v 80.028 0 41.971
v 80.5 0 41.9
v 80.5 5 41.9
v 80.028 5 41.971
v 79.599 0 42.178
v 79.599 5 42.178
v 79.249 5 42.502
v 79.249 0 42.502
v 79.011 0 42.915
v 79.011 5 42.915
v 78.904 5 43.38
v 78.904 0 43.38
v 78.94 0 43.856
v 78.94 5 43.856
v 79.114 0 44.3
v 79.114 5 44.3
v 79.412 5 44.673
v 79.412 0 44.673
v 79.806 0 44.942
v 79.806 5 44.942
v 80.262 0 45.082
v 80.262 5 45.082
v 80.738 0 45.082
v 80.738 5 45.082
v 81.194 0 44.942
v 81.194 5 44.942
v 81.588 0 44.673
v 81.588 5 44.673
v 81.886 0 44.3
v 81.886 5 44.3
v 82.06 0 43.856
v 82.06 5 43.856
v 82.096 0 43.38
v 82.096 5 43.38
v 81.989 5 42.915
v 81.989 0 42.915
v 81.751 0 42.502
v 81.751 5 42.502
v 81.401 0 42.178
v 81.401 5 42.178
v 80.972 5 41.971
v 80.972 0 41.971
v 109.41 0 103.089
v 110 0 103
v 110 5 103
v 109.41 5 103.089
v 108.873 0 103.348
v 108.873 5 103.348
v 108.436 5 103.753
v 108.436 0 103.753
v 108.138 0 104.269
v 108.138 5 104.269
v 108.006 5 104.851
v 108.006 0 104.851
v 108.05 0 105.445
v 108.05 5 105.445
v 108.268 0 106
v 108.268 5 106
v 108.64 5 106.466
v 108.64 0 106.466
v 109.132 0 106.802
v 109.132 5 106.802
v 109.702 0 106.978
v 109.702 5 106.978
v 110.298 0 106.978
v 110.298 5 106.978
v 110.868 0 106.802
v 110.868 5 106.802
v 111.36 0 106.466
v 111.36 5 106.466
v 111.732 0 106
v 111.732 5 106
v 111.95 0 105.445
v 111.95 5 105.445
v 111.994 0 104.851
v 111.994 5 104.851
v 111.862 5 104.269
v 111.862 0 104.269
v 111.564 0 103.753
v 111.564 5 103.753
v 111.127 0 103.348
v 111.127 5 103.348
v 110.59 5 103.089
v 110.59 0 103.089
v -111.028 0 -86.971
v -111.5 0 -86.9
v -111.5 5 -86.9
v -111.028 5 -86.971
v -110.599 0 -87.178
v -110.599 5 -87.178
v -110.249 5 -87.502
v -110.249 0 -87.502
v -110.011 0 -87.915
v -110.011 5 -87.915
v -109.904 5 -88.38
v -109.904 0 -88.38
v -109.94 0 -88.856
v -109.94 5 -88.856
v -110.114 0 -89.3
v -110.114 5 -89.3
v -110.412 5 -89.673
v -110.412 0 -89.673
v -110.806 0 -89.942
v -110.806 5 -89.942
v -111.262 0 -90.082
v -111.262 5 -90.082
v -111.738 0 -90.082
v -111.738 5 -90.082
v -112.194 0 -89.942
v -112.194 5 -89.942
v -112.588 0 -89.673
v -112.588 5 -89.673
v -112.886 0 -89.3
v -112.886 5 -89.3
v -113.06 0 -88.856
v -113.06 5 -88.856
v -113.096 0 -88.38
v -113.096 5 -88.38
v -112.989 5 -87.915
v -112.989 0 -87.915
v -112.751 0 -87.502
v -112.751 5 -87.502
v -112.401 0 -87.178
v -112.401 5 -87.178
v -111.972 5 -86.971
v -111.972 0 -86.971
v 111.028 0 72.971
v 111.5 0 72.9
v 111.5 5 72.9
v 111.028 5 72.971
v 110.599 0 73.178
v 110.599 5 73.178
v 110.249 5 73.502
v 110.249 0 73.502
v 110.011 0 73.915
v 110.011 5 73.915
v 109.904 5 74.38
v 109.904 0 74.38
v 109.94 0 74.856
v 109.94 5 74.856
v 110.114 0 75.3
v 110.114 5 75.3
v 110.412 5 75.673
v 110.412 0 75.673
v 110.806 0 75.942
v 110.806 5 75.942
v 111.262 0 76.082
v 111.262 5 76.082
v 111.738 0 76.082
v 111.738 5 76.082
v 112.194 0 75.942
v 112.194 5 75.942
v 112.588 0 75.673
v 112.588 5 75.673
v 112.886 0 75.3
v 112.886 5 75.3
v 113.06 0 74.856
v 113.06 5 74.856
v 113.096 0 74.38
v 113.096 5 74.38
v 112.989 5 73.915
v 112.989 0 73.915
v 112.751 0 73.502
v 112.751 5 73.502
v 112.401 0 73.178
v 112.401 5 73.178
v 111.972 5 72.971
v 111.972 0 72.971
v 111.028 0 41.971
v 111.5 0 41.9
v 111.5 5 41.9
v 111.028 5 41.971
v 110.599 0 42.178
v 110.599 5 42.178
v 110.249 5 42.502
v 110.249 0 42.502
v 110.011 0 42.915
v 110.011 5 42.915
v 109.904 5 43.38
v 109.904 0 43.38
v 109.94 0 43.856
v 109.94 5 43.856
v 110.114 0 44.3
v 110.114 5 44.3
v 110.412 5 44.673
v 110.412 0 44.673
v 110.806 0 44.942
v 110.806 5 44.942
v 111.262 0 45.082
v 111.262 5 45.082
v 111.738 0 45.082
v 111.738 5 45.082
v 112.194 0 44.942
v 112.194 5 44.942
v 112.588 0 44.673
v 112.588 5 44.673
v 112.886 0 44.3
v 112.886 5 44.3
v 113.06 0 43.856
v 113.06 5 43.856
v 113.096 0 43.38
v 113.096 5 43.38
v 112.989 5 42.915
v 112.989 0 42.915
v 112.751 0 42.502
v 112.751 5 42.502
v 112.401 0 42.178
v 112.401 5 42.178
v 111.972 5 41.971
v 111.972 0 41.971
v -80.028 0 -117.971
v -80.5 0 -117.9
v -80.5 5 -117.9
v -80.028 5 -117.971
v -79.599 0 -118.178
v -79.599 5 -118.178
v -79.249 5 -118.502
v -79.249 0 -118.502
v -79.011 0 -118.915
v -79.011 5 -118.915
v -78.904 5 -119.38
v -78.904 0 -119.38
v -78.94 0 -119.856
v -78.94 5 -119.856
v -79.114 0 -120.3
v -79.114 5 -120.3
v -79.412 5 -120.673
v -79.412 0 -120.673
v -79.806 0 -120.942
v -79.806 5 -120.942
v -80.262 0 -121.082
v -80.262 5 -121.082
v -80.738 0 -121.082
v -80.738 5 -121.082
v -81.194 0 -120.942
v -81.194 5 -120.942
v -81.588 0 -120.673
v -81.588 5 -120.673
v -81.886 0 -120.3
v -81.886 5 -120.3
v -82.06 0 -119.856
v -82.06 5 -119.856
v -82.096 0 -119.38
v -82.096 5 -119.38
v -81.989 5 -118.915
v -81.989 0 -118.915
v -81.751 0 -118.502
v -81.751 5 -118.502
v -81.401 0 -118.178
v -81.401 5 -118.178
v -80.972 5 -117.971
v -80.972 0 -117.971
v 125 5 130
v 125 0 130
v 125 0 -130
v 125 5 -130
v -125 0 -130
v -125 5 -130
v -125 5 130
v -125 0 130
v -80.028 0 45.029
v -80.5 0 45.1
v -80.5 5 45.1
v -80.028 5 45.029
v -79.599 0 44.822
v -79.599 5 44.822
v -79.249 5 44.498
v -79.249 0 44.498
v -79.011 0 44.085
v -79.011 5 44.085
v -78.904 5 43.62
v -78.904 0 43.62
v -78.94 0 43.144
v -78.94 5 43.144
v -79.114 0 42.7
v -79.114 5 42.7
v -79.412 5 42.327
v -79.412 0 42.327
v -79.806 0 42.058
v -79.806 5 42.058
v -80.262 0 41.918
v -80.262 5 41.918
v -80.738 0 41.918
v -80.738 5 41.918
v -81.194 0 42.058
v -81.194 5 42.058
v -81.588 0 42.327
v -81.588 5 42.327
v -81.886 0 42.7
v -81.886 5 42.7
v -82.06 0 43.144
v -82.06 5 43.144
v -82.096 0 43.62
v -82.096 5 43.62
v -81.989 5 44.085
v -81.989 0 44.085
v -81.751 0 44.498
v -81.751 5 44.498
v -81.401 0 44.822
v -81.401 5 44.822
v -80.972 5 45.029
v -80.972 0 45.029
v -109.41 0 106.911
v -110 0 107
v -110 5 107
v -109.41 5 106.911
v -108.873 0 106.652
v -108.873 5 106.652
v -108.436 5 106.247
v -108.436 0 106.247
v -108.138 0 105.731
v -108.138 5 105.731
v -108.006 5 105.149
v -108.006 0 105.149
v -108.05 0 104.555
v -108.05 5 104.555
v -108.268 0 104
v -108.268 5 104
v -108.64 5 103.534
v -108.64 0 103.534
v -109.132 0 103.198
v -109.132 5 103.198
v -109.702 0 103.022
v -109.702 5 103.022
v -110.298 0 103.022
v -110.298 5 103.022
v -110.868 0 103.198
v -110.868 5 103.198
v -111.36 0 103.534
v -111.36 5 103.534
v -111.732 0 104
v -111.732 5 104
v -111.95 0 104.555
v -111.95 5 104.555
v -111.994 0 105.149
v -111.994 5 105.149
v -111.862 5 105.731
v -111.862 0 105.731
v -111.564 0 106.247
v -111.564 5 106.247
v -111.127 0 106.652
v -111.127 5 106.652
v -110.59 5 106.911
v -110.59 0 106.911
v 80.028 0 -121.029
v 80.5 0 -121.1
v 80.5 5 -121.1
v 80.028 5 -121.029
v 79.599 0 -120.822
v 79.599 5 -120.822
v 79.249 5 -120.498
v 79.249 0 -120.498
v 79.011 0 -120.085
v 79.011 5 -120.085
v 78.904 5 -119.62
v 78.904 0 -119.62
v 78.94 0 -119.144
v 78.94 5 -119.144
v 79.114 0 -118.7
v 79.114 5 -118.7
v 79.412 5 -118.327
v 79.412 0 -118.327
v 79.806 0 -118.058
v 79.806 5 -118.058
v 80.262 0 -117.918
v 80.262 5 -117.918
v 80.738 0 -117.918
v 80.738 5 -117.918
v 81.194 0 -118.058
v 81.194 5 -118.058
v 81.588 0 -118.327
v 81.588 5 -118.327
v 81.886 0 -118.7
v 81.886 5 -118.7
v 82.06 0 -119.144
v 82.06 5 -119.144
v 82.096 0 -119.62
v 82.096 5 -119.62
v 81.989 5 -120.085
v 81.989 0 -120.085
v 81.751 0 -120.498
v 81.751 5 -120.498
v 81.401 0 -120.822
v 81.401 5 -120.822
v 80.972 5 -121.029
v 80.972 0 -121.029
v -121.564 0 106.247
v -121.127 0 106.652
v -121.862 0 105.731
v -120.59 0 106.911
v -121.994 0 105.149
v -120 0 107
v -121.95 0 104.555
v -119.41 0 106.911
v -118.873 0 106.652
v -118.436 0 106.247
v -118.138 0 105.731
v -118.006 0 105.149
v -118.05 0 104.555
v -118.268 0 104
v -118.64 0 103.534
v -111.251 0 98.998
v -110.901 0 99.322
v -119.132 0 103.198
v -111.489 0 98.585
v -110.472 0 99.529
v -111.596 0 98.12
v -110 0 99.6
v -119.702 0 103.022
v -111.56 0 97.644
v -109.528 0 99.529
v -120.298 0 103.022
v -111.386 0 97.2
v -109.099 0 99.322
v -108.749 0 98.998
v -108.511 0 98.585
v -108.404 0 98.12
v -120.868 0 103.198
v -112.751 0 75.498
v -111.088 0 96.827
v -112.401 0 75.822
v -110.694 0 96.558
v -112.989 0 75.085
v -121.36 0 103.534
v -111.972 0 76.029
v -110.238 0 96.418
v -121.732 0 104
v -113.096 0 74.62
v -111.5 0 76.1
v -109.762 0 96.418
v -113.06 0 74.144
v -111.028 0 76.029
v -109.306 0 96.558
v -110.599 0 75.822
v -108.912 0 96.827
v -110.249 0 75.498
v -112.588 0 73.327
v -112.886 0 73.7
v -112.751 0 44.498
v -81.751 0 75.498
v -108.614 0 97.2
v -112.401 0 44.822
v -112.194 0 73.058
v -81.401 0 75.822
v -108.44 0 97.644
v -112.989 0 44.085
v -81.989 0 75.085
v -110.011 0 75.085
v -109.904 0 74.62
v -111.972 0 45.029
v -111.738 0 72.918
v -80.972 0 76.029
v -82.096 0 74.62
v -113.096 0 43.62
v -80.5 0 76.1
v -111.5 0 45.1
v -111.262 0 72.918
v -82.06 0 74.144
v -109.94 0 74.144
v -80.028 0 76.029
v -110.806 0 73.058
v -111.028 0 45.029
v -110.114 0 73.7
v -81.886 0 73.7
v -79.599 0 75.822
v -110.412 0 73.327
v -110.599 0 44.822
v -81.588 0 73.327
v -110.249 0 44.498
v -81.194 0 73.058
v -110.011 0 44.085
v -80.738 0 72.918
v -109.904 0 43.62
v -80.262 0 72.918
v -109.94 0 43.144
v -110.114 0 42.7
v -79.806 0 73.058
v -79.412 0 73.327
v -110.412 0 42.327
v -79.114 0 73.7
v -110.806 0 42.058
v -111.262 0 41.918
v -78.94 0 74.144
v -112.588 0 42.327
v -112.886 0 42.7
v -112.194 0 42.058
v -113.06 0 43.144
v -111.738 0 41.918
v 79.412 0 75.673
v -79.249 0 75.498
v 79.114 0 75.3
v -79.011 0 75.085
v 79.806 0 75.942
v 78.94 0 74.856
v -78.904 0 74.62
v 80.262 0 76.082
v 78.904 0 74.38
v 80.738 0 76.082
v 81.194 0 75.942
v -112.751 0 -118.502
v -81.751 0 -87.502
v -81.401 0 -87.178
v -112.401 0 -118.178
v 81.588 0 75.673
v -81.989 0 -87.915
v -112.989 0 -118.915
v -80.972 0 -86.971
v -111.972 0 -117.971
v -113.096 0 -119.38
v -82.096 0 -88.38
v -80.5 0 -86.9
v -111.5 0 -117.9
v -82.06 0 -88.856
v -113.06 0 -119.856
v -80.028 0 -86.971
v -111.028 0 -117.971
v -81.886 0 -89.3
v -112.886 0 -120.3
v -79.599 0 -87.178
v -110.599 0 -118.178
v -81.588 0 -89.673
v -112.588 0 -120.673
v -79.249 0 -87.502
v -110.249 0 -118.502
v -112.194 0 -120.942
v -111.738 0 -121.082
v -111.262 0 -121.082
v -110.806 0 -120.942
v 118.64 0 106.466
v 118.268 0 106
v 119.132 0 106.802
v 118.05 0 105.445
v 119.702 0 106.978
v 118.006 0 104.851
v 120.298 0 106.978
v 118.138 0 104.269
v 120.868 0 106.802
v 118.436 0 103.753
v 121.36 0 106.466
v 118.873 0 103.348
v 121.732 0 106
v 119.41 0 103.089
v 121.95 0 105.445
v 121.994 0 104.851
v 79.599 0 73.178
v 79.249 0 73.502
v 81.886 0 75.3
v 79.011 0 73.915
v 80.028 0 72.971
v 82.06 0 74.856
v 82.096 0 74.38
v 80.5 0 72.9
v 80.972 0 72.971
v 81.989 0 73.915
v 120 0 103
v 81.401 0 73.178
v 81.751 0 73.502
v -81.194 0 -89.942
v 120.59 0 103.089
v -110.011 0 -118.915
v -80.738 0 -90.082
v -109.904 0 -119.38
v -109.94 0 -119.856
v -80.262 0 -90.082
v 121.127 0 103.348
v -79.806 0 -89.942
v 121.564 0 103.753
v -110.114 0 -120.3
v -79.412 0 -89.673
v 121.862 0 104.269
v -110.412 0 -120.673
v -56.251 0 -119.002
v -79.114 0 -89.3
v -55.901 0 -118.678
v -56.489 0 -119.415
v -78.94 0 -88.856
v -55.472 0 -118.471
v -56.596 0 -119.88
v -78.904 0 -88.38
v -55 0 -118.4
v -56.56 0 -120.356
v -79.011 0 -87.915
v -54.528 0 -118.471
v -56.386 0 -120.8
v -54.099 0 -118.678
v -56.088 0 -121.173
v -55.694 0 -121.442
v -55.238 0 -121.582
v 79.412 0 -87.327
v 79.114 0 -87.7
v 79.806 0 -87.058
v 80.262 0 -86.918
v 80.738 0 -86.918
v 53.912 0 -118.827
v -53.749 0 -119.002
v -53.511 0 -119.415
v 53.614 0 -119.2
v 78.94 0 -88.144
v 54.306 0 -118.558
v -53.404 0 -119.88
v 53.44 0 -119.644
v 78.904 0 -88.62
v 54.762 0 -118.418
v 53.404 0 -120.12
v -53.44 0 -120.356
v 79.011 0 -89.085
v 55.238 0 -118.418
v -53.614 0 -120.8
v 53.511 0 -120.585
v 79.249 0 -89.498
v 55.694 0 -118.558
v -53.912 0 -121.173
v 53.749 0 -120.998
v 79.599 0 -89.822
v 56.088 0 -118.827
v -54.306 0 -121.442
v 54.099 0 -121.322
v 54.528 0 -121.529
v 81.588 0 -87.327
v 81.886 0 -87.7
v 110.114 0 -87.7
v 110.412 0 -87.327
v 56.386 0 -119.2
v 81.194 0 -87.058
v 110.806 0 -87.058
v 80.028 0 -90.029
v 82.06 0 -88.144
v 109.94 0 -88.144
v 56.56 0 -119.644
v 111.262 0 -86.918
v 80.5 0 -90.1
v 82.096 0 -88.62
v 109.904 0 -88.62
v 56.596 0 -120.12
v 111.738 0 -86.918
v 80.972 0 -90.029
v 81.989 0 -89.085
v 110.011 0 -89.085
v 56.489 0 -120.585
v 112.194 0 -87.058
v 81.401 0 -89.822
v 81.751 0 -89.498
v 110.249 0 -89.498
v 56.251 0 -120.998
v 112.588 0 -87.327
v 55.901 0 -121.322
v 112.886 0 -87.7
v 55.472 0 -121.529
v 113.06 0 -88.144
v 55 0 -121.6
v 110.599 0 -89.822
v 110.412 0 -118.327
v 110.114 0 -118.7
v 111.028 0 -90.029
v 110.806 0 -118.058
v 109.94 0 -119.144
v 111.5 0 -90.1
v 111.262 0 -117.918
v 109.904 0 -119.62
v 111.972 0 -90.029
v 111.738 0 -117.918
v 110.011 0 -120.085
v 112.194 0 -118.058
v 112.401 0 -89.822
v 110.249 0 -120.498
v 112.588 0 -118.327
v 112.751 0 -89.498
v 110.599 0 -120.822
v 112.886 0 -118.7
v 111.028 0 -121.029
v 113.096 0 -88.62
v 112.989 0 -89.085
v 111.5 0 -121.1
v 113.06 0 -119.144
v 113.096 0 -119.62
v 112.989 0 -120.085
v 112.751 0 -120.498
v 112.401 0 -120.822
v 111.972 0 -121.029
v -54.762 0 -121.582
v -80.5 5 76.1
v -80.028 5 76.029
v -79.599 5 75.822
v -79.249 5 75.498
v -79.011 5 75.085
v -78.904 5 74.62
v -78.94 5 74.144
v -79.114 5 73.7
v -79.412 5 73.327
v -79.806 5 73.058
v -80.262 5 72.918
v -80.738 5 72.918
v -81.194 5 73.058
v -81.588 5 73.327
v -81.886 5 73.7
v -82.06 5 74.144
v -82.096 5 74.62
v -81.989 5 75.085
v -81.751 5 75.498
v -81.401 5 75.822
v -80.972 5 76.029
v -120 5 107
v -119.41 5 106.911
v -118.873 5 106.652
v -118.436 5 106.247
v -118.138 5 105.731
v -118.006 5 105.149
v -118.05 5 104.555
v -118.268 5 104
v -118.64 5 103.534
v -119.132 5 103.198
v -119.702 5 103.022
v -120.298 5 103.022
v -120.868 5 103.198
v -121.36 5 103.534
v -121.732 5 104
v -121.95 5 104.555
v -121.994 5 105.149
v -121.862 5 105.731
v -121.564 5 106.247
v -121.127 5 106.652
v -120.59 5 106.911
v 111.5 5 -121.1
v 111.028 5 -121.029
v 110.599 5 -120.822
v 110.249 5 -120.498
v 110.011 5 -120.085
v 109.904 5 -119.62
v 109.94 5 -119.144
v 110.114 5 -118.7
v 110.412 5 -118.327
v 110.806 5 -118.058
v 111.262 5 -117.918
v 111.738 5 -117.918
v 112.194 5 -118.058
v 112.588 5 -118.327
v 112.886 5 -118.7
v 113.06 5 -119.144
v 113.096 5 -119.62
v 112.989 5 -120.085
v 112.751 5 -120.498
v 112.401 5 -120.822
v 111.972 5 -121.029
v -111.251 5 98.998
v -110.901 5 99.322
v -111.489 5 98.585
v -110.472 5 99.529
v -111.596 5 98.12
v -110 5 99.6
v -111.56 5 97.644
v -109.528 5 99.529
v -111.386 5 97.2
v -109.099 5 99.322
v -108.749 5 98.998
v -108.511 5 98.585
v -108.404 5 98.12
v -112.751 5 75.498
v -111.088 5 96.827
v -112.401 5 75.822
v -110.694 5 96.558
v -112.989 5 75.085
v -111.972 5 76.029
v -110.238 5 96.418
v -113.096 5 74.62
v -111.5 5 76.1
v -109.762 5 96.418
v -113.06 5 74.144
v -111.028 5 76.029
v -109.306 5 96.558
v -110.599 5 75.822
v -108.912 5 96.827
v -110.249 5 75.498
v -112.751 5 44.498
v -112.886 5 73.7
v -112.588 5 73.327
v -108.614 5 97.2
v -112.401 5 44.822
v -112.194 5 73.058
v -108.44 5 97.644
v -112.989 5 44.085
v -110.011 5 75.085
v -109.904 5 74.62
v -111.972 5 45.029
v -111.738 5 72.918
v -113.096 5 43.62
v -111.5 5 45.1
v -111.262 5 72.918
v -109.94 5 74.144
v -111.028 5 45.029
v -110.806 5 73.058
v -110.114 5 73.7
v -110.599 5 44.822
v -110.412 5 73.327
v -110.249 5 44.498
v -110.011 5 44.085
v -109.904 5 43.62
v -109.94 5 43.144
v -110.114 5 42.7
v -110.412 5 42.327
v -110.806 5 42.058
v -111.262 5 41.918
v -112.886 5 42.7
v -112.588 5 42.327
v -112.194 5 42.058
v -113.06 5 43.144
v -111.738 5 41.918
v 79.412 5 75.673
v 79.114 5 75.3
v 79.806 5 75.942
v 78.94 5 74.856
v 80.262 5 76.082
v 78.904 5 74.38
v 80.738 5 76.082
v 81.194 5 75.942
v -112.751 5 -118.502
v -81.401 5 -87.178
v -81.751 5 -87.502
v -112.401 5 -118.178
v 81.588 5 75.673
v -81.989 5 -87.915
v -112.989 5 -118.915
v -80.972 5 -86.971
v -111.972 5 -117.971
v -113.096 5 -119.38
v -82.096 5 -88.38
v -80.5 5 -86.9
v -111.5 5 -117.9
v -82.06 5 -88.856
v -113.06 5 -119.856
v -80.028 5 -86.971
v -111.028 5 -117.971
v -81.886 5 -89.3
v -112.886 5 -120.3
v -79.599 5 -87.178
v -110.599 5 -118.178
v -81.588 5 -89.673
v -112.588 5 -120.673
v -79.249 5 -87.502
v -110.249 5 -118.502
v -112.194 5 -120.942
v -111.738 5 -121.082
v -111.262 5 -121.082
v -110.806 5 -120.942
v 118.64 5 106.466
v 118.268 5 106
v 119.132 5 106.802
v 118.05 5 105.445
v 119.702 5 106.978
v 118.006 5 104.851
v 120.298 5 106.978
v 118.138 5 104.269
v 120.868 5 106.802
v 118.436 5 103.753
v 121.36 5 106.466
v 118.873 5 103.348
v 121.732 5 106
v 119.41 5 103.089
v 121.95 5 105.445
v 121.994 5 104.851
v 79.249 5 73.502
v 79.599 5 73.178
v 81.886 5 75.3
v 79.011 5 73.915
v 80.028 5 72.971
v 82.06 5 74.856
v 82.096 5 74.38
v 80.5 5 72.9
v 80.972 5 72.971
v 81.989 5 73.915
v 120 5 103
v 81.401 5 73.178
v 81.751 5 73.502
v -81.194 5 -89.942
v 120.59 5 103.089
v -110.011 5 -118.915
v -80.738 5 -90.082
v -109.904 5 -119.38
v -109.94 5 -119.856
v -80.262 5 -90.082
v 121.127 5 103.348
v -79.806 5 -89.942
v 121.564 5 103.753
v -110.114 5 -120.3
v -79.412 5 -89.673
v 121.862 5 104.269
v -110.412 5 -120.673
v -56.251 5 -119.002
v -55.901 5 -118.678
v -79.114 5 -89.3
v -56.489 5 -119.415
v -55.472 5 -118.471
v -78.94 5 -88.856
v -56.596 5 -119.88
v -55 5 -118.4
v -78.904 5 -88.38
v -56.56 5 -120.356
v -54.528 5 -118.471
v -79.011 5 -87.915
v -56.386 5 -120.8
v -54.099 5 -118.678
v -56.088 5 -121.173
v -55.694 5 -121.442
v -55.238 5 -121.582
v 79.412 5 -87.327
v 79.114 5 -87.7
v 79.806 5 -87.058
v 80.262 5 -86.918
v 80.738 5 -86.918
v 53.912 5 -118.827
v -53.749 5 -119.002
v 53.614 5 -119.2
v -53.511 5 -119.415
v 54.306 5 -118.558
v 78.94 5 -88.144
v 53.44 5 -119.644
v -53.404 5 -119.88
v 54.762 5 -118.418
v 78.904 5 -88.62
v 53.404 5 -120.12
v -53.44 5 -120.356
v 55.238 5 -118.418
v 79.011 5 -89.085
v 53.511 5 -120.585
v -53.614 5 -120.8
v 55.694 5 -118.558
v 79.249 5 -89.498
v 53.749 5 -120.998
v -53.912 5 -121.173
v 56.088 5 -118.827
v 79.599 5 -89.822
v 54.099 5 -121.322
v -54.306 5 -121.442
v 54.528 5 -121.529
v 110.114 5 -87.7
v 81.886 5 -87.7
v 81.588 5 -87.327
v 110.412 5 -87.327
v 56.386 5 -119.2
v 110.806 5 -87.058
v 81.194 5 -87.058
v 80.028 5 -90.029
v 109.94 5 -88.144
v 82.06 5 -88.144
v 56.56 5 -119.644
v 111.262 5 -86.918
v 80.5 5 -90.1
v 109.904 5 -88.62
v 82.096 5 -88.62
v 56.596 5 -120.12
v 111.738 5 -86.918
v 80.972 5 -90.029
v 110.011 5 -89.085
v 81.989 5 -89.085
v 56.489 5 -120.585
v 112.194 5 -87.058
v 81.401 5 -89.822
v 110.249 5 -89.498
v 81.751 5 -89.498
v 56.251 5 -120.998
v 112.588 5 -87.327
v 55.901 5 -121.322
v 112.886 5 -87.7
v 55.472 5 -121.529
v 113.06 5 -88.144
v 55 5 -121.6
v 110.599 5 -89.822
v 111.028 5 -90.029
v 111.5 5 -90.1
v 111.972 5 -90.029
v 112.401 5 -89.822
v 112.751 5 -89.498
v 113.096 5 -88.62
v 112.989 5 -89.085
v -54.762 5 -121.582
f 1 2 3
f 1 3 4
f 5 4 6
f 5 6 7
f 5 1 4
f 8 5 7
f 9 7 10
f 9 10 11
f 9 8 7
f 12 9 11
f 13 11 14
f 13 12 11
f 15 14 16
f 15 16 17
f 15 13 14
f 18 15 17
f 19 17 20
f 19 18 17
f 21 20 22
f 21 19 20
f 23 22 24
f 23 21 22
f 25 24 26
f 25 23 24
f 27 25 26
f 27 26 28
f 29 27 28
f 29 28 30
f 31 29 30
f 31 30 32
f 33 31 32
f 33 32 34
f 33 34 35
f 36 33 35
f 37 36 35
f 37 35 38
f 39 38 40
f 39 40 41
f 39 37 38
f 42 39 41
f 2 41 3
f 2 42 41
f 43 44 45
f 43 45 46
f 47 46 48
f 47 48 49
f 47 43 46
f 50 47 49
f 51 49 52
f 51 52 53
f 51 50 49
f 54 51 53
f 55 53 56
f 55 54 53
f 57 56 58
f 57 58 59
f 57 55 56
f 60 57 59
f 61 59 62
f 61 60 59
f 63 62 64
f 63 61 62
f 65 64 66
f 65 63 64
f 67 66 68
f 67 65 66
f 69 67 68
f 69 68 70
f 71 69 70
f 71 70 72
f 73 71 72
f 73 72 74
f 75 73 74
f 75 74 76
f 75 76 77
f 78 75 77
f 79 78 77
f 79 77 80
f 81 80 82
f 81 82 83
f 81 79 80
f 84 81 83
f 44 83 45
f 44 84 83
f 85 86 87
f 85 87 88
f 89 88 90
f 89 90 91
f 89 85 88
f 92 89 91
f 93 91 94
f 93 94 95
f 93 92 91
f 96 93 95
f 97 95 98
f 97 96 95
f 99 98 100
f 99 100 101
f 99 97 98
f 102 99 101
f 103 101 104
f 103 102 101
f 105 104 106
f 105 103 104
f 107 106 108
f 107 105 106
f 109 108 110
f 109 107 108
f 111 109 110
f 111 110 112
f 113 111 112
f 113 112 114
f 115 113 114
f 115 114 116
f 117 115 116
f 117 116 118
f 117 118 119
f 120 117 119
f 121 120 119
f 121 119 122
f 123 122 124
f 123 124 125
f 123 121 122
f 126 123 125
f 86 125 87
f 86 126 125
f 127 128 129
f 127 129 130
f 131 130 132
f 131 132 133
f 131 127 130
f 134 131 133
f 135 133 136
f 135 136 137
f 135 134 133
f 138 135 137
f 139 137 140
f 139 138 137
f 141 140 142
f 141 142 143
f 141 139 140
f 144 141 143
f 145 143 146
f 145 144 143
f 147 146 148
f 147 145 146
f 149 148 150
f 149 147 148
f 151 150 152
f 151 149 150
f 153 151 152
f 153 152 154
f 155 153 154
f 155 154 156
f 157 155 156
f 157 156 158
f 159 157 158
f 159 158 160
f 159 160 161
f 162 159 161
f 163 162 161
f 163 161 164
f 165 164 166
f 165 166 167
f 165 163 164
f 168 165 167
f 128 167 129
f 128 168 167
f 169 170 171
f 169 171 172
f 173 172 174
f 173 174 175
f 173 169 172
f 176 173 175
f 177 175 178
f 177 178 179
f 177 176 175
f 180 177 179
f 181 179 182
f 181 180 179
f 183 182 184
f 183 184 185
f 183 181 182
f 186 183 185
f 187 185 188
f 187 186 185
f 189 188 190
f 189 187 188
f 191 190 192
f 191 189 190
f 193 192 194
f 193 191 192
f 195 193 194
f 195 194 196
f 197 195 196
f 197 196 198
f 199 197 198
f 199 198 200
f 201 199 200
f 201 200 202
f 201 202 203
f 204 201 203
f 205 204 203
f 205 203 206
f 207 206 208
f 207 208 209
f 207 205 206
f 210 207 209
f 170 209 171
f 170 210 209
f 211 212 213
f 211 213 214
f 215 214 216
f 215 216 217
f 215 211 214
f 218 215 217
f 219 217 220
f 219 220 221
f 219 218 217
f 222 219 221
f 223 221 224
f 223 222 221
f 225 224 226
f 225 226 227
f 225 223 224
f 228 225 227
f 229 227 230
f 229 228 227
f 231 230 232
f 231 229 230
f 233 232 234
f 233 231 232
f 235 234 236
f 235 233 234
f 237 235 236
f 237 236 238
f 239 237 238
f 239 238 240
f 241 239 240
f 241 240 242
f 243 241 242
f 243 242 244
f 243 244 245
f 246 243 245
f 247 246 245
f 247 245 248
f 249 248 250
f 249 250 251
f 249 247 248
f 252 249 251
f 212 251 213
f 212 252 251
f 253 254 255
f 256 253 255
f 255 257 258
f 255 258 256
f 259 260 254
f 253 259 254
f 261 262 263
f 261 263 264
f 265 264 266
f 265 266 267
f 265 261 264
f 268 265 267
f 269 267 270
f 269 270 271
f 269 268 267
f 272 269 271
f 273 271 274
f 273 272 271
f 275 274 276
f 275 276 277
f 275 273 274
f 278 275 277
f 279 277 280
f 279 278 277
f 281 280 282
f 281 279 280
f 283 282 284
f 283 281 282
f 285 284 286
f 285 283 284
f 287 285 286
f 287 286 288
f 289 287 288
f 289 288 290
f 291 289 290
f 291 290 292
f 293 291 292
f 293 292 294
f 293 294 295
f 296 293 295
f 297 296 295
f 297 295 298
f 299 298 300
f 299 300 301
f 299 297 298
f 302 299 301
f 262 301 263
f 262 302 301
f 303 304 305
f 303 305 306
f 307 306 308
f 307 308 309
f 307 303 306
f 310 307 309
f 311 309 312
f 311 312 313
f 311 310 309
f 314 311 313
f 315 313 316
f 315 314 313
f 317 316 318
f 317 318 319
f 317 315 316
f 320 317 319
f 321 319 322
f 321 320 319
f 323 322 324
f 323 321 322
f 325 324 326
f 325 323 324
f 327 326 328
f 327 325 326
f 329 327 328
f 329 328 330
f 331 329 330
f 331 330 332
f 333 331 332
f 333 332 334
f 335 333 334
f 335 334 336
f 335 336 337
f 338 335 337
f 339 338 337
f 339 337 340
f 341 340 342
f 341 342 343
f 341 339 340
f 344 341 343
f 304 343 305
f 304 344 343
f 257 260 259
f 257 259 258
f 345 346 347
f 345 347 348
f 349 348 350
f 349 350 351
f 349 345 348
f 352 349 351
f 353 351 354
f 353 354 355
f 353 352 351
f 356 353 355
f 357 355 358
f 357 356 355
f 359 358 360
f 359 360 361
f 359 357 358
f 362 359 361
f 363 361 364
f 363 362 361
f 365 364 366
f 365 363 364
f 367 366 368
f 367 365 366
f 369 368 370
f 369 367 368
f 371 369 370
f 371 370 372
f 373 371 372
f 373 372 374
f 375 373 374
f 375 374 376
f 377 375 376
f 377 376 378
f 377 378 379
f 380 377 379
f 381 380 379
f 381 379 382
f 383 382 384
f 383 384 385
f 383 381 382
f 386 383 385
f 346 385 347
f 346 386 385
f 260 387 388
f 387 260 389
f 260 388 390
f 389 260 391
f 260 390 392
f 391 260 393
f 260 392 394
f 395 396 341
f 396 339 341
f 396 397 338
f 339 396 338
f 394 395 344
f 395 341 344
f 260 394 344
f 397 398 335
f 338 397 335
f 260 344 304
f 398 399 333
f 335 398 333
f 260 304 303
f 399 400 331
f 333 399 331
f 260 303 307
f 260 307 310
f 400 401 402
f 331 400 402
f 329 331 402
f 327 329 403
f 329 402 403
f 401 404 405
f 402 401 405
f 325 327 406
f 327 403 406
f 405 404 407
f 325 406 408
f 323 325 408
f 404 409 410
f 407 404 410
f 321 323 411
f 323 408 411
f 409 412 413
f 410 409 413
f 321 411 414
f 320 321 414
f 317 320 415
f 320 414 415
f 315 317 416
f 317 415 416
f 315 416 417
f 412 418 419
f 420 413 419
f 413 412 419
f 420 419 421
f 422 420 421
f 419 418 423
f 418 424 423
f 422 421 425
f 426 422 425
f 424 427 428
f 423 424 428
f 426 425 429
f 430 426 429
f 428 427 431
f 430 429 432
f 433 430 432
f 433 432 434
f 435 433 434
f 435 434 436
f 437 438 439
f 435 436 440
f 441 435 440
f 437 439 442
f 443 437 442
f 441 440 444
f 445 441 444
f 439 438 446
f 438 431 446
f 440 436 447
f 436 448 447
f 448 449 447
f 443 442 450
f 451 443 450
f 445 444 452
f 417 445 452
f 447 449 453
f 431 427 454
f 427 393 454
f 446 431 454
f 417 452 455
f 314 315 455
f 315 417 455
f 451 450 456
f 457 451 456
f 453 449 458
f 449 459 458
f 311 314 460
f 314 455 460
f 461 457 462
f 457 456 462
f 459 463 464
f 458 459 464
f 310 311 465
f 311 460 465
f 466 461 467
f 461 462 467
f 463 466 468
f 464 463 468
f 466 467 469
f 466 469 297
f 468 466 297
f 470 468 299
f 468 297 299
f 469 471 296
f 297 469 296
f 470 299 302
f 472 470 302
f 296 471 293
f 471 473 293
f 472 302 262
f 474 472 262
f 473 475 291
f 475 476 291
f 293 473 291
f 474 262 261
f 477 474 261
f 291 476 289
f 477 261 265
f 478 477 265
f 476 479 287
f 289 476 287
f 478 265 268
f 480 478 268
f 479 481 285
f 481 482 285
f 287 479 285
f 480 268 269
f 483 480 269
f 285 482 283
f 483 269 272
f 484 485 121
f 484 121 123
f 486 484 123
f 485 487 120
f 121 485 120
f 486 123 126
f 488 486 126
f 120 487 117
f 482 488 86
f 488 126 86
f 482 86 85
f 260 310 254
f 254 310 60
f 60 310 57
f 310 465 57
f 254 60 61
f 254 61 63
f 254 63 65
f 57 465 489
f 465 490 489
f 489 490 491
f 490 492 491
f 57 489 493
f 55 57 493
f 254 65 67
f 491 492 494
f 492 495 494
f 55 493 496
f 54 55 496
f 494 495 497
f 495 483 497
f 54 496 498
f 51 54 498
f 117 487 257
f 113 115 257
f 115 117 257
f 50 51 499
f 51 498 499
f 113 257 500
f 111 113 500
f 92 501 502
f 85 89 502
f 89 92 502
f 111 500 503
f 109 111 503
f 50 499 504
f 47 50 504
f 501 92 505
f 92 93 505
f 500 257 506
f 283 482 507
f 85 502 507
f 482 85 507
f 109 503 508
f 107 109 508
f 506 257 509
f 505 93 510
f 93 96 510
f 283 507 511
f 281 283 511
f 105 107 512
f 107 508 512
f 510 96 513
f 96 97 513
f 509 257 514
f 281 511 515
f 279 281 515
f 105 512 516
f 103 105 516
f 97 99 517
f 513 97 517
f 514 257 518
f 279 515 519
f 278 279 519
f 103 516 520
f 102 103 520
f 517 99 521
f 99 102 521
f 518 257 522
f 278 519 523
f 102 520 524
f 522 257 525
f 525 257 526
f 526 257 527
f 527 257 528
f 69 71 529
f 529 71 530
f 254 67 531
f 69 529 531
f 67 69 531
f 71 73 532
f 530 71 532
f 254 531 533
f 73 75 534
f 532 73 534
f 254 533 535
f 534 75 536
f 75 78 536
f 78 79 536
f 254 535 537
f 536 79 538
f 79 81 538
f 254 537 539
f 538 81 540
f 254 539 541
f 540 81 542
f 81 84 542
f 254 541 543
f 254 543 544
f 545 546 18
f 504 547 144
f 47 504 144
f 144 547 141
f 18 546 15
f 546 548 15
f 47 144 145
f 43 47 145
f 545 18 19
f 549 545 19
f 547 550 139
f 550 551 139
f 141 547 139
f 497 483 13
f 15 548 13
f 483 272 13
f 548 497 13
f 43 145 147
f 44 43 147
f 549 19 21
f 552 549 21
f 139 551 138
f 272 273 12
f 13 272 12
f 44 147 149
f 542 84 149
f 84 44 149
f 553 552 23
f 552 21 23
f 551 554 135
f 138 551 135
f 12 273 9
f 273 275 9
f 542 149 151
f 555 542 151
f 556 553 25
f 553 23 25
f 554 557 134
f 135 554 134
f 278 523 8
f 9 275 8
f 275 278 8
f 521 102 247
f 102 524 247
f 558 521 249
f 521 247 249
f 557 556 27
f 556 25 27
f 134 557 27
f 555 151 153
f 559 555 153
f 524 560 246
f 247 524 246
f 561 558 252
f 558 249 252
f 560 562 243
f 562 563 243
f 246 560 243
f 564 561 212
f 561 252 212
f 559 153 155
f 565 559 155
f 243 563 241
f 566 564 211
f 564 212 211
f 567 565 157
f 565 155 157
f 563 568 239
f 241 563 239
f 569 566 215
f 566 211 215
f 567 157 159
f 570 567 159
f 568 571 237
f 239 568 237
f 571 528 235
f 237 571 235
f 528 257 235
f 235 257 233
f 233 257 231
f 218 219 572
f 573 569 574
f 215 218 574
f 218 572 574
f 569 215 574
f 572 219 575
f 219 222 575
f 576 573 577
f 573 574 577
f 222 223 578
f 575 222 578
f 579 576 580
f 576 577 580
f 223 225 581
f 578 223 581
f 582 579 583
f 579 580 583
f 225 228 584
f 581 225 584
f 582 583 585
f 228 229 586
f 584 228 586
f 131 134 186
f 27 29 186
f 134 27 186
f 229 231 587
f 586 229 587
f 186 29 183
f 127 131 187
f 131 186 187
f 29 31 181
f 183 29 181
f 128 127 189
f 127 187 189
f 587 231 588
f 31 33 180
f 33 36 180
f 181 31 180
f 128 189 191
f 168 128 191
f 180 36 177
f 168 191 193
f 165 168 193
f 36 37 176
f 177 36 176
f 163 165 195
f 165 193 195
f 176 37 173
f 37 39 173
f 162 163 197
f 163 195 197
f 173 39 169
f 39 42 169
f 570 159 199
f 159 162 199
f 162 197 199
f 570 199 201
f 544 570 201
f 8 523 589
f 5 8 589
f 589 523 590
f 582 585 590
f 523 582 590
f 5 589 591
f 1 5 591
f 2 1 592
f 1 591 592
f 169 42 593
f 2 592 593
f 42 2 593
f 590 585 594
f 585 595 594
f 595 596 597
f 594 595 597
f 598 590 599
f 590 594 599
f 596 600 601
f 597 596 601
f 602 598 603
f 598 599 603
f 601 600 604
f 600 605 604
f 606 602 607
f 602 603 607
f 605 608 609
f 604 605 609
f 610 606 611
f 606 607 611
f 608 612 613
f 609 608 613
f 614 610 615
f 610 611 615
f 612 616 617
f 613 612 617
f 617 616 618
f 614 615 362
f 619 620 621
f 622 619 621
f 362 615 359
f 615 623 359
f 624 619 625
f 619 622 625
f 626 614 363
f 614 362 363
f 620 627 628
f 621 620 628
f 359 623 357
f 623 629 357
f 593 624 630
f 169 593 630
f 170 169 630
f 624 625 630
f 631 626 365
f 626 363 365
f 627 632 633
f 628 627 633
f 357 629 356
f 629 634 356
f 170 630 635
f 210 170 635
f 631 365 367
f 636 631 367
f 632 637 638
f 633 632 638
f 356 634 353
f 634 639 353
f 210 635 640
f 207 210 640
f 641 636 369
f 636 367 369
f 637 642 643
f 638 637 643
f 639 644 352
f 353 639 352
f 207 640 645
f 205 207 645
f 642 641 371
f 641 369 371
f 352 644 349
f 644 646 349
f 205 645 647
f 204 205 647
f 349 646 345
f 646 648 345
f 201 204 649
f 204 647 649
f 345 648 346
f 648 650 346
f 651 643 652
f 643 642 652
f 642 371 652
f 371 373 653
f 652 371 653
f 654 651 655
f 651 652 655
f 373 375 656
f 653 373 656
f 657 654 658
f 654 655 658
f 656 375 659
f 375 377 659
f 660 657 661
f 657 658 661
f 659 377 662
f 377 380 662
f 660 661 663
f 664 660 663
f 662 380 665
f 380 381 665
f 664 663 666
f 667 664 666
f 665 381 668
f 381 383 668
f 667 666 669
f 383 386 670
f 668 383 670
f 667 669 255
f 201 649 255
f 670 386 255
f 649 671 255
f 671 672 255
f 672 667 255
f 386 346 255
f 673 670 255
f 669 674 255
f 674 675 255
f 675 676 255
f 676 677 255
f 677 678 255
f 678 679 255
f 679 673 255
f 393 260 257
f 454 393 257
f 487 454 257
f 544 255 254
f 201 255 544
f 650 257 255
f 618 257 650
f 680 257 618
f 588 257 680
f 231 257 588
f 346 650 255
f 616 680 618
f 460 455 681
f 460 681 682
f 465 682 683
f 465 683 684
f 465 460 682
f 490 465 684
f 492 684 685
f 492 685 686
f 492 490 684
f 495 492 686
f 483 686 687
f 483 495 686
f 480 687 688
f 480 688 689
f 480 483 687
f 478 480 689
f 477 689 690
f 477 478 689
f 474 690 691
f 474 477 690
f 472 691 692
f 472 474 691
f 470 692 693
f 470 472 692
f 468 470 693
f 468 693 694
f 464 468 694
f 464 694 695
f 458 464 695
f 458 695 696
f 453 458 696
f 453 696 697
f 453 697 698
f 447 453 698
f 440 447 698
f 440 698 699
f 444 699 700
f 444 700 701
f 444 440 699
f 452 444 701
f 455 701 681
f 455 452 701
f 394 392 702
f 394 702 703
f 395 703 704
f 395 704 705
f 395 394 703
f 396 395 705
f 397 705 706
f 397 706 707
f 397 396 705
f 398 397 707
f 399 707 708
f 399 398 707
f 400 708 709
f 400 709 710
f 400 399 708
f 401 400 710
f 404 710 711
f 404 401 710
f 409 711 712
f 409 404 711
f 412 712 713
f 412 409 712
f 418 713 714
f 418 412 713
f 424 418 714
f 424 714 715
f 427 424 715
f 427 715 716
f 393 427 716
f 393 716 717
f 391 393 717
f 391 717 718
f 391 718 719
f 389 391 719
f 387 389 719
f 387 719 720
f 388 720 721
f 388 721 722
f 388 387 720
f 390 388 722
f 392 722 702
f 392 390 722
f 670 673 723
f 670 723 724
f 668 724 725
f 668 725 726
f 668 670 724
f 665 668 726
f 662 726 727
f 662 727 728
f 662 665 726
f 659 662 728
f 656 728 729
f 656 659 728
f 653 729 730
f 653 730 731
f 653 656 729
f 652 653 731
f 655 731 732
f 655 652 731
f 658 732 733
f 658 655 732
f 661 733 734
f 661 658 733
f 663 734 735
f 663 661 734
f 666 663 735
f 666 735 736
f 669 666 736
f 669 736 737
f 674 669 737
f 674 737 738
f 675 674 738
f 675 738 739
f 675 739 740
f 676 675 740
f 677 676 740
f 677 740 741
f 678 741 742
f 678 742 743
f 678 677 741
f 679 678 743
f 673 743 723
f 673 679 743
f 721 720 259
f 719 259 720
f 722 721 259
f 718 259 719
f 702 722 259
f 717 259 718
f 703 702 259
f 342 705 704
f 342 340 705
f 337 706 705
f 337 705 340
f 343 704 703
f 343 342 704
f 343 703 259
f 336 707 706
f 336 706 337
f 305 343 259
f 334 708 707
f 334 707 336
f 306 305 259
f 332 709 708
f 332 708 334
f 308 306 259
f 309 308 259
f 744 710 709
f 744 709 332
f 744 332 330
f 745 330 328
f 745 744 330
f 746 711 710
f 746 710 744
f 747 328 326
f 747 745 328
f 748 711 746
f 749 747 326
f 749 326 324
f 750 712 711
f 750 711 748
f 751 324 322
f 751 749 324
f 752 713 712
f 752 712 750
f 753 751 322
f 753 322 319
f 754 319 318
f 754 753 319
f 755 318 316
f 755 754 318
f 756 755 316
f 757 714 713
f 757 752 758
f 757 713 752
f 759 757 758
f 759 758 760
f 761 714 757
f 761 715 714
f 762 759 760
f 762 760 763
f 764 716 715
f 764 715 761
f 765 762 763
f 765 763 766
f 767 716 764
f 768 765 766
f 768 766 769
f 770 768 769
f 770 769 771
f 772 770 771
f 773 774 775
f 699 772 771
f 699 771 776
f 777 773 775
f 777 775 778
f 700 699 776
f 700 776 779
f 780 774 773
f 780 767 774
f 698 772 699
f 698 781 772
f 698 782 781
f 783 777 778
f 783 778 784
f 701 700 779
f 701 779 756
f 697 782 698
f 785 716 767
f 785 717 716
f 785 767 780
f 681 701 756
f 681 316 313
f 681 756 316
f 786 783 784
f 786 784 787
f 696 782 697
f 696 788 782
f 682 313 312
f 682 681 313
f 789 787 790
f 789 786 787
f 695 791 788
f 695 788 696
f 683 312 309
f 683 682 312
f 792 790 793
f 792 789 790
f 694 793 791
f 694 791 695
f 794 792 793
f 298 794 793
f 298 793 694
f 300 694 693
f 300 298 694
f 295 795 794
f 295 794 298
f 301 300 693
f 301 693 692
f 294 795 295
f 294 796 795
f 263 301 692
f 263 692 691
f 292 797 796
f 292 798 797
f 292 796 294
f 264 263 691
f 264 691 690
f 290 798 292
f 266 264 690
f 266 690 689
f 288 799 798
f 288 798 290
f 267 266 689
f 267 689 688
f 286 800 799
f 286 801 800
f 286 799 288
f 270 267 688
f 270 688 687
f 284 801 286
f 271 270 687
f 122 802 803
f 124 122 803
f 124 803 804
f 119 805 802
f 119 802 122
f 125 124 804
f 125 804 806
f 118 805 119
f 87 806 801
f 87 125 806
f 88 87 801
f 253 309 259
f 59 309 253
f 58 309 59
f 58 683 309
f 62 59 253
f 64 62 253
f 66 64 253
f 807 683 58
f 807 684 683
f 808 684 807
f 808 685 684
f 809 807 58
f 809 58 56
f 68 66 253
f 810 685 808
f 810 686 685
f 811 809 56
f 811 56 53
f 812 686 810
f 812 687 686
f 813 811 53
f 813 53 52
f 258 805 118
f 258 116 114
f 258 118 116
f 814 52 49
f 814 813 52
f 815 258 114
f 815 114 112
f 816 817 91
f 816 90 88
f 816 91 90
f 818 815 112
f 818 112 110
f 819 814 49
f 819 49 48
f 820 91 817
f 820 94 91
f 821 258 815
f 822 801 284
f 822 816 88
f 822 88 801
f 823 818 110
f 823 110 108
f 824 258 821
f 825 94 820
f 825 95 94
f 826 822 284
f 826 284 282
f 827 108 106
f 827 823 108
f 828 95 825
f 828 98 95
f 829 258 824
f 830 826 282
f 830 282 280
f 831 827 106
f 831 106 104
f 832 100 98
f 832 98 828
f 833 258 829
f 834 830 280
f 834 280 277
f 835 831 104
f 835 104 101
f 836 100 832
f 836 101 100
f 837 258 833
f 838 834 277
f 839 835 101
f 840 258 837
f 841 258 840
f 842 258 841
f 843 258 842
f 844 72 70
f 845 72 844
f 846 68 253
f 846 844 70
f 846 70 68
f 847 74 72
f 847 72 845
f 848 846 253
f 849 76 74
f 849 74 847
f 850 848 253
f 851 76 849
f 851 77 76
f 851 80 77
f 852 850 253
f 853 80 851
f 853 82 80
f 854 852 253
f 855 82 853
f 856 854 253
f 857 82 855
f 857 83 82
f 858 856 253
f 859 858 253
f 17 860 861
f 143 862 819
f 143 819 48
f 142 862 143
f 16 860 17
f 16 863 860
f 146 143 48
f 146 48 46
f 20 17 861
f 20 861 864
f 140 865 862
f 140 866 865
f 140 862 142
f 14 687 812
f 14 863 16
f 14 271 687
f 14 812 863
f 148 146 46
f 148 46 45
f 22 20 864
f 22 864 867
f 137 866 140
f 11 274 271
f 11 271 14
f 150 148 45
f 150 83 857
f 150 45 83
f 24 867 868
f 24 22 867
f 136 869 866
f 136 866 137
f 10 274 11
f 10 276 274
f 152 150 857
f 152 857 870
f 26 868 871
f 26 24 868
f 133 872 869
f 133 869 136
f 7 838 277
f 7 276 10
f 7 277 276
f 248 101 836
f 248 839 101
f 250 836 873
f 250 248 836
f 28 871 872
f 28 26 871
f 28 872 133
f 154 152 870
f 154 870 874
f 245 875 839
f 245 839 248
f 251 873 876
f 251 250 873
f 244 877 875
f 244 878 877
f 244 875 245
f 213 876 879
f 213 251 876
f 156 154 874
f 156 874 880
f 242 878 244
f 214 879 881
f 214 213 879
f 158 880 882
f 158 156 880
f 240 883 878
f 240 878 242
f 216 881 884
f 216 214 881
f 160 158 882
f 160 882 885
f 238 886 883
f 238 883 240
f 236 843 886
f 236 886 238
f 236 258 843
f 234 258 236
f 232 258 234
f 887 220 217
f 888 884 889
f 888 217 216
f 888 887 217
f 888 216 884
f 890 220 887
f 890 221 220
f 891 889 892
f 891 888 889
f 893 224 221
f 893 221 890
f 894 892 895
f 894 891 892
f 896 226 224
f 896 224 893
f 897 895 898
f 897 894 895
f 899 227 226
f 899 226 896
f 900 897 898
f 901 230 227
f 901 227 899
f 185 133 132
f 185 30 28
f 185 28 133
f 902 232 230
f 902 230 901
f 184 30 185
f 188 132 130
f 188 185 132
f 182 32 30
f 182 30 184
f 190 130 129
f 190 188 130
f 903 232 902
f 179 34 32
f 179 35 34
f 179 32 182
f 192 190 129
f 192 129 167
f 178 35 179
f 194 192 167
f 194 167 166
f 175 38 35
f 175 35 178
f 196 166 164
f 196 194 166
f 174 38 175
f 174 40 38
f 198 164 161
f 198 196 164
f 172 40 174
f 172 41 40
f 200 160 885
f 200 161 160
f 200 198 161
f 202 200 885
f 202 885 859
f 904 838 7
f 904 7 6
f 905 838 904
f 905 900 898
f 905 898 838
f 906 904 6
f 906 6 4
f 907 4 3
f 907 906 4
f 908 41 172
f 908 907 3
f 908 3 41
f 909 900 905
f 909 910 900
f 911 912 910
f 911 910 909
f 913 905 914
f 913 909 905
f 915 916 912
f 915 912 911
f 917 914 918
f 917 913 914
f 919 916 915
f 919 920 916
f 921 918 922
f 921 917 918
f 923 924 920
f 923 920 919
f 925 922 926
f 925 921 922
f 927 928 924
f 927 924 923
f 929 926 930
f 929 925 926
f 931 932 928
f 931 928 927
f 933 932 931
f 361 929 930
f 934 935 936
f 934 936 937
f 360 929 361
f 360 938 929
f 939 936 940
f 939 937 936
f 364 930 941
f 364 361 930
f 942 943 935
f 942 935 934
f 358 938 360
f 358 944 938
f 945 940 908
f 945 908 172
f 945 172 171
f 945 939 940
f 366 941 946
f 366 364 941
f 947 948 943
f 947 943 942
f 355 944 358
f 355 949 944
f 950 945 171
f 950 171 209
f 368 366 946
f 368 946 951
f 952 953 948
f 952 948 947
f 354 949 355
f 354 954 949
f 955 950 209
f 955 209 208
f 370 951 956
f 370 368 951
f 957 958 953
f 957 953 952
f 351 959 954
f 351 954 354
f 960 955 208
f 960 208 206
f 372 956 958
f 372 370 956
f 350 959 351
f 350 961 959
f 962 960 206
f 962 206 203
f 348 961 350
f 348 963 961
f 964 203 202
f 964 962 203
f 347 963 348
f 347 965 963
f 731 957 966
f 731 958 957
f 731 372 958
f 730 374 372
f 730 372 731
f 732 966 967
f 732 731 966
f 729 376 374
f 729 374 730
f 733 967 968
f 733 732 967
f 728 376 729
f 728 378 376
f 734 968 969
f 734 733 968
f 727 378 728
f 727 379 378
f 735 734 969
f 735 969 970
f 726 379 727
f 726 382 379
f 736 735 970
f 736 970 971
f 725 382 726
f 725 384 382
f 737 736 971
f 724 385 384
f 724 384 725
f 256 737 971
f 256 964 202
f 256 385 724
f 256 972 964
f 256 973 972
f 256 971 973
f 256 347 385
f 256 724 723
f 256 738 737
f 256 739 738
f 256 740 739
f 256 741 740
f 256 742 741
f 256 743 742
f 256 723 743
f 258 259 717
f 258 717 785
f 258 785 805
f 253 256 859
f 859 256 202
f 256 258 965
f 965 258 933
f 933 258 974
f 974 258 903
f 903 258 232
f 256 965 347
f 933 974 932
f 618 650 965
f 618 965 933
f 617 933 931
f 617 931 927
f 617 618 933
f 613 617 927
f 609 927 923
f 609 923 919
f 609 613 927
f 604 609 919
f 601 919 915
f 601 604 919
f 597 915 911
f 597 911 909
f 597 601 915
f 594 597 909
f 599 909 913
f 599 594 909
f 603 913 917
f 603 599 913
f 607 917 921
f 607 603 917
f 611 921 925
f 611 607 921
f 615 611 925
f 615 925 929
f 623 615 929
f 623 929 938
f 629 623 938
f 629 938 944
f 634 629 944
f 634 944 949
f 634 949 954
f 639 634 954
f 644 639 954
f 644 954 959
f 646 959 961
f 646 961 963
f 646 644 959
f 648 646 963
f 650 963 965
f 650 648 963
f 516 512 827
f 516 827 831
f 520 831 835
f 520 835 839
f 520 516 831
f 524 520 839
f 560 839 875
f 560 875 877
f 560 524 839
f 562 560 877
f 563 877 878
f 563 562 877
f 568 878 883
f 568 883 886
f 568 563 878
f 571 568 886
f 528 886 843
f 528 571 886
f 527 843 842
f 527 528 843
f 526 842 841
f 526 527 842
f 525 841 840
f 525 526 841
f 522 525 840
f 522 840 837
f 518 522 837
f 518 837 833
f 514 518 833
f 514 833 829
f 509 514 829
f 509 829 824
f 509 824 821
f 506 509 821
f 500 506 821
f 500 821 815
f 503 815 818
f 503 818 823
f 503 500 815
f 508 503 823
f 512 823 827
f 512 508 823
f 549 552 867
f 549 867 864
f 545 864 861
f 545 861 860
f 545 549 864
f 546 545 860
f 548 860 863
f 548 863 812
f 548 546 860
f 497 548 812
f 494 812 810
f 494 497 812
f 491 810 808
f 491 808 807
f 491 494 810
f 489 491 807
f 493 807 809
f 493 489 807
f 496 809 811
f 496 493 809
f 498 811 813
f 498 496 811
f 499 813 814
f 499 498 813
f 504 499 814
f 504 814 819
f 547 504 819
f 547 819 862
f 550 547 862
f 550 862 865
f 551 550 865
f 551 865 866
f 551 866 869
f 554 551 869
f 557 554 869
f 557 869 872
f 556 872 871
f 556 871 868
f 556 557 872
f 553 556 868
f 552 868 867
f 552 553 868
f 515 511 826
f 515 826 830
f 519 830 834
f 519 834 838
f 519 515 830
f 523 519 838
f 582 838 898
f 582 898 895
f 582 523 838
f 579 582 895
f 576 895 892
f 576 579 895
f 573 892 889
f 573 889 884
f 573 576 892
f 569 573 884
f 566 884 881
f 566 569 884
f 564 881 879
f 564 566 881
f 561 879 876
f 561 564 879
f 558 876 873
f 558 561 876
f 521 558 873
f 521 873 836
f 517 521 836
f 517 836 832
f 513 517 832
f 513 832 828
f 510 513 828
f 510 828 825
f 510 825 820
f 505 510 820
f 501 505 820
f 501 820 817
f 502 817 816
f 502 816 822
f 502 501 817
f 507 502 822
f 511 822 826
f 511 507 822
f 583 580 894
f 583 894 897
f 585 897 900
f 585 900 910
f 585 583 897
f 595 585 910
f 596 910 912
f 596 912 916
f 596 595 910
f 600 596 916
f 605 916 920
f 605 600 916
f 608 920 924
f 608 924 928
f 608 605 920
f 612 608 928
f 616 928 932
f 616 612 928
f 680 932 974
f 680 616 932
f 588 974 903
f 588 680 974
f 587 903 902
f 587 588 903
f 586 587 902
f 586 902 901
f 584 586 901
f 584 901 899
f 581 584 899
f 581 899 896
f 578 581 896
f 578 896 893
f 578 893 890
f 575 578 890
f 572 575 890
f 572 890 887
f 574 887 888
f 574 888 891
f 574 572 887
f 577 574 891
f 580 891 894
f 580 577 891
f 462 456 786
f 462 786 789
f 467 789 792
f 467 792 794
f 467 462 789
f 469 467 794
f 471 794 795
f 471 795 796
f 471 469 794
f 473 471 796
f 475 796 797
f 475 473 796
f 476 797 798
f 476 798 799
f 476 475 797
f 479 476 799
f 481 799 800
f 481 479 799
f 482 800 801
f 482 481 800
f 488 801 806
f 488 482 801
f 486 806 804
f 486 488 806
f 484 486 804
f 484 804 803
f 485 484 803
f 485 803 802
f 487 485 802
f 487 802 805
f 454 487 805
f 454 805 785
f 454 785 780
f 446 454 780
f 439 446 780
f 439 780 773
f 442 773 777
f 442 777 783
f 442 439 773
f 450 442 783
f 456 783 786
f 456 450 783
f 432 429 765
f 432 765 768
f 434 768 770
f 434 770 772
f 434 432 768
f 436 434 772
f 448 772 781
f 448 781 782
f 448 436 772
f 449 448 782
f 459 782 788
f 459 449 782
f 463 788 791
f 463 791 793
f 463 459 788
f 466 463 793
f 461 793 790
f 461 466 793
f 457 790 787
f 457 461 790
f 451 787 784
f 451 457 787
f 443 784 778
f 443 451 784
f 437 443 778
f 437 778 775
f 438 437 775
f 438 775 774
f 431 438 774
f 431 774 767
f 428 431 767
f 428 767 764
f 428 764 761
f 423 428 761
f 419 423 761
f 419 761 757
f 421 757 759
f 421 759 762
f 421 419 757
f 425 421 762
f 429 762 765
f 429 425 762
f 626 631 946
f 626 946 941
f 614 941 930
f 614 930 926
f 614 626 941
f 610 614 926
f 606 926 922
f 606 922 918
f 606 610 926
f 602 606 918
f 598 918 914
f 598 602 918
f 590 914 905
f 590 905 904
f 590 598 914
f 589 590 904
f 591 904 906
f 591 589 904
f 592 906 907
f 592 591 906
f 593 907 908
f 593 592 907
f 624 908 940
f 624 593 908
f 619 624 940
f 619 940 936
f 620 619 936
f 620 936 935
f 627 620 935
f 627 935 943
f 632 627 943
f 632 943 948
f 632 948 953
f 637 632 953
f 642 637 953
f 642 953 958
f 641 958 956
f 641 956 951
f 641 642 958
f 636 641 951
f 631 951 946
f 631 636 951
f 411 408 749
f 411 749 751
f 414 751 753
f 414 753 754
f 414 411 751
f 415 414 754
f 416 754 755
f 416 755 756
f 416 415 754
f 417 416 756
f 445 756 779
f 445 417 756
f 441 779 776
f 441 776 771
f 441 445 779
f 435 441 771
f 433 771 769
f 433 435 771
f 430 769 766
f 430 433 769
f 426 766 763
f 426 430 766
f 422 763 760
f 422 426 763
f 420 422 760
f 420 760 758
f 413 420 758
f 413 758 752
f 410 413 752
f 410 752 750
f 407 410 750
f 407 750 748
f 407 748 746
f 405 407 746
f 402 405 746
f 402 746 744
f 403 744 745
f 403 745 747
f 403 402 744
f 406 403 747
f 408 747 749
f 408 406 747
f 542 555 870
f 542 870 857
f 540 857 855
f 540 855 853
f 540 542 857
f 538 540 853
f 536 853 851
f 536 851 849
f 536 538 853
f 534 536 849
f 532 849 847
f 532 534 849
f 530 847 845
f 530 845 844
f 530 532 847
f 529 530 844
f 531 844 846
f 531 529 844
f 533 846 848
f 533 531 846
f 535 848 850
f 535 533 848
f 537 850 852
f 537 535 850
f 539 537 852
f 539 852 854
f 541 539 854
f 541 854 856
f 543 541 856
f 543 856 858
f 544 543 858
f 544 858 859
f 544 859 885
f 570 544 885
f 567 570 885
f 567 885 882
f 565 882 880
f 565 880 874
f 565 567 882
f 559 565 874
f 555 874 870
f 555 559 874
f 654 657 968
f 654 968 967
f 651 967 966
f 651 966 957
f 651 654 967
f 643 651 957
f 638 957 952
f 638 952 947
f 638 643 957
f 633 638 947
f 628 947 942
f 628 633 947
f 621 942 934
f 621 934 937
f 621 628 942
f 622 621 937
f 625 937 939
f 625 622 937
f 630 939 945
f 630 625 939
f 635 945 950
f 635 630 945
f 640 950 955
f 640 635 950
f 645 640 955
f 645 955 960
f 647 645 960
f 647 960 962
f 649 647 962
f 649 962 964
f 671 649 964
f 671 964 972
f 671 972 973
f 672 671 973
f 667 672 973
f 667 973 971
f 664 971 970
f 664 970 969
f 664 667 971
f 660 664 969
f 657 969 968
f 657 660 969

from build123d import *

# Parameters (mm, degrees)
SKETCH_1_W      = 250
SKETCH_1_H      = 260
SKETCH_1_R      = 1.6
SKETCH_1_R_2    = 2
EXTRUDE_1_DEPTH = 5


with BuildPart() as part:
    # 草图1 → 凸台-拉伸1 (new body)
    with BuildSketch(Plane(origin=(0, 0, 0), x_dir=(1, 0, 0), z_dir=(0, 1, 0))):
        Rectangle(SKETCH_1_W, SKETCH_1_H)
        with Locations(Location((-111.5, 119.5, 0), (0, 0, 270))):
            Circle(SKETCH_1_R, mode=Mode.SUBTRACT)
        with Locations(Location((-80.5, 119.5, 0), (0, 0, 270))):
            Circle(SKETCH_1_R, mode=Mode.SUBTRACT)
        with Locations(Location((-80.5, 88.5, 0), (0, 0, 270))):
            Circle(SKETCH_1_R, mode=Mode.SUBTRACT)
        with Locations(Location((-111.5, 88.5, 0), (0, 0, 270))):
            Circle(SKETCH_1_R, mode=Mode.SUBTRACT)
        with Locations(Location((-111.5, -43.5, 0), (0, 0, 270))):
            Circle(SKETCH_1_R, mode=Mode.SUBTRACT)
        with Locations(Location((-80.5, -43.5, 0), (0, 0, 270))):
            Circle(SKETCH_1_R, mode=Mode.SUBTRACT)
        with Locations(Location((-80.5, -74.5, 0), (0, 0, 270))):
            Circle(SKETCH_1_R, mode=Mode.SUBTRACT)
        with Locations(Location((-111.5, -74.5, 0), (0, 0, 270))):
            Circle(SKETCH_1_R, mode=Mode.SUBTRACT)
        with Locations(Location((111.5, -74.5, 0), (0, 0, 90))):
            Circle(SKETCH_1_R, mode=Mode.SUBTRACT)
        with Locations(Location((80.5, -74.5, 0), (0, 0, 90))):
            Circle(SKETCH_1_R, mode=Mode.SUBTRACT)
        with Locations(Location((80.5, -43.5, 0), (0, 0, 90))):
            Circle(SKETCH_1_R, mode=Mode.SUBTRACT)
        with Locations(Location((111.5, -43.5, 0), (0, 0, 90))):
            Circle(SKETCH_1_R, mode=Mode.SUBTRACT)
        with Locations(Location((111.5, 88.5, 0), (0, 0, 90))):
            Circle(SKETCH_1_R, mode=Mode.SUBTRACT)
        with Locations(Location((80.5, 88.5, 0), (0, 0, 90))):
            Circle(SKETCH_1_R, mode=Mode.SUBTRACT)
        with Locations(Location((80.5, 119.5, 0), (0, 0, 90))):
            Circle(SKETCH_1_R, mode=Mode.SUBTRACT)
        with Locations(Location((111.5, 119.5, 0), (0, 0, 90))):
            Circle(SKETCH_1_R, mode=Mode.SUBTRACT)
        with Locations(Location((-120, -105, 0), (0, 0, 270))):
            Circle(SKETCH_1_R_2, mode=Mode.SUBTRACT)
        with Locations(Location((-110, -105, 0), (0, 0, 270))):
            Circle(SKETCH_1_R_2, mode=Mode.SUBTRACT)
        with Locations(Location((110, -105, 0), (0, 0, 90))):
            Circle(SKETCH_1_R_2, mode=Mode.SUBTRACT)
        with Locations(Location((120, -105, 0), (0, 0, 90))):
            Circle(SKETCH_1_R_2, mode=Mode.SUBTRACT)
        with Locations(Location((-55, 120, 0), (0, 0, 270))):
            Circle(SKETCH_1_R, mode=Mode.SUBTRACT)
        with Locations(Location((55, 120, 0), (0, 0, 90))):
            Circle(SKETCH_1_R, mode=Mode.SUBTRACT)
        with Locations(Location((-110, -98, 0), (0, 0, 270))):
            Circle(SKETCH_1_R, mode=Mode.SUBTRACT)
    extrude(amount=EXTRUDE_1_DEPTH)


solid = part.part
